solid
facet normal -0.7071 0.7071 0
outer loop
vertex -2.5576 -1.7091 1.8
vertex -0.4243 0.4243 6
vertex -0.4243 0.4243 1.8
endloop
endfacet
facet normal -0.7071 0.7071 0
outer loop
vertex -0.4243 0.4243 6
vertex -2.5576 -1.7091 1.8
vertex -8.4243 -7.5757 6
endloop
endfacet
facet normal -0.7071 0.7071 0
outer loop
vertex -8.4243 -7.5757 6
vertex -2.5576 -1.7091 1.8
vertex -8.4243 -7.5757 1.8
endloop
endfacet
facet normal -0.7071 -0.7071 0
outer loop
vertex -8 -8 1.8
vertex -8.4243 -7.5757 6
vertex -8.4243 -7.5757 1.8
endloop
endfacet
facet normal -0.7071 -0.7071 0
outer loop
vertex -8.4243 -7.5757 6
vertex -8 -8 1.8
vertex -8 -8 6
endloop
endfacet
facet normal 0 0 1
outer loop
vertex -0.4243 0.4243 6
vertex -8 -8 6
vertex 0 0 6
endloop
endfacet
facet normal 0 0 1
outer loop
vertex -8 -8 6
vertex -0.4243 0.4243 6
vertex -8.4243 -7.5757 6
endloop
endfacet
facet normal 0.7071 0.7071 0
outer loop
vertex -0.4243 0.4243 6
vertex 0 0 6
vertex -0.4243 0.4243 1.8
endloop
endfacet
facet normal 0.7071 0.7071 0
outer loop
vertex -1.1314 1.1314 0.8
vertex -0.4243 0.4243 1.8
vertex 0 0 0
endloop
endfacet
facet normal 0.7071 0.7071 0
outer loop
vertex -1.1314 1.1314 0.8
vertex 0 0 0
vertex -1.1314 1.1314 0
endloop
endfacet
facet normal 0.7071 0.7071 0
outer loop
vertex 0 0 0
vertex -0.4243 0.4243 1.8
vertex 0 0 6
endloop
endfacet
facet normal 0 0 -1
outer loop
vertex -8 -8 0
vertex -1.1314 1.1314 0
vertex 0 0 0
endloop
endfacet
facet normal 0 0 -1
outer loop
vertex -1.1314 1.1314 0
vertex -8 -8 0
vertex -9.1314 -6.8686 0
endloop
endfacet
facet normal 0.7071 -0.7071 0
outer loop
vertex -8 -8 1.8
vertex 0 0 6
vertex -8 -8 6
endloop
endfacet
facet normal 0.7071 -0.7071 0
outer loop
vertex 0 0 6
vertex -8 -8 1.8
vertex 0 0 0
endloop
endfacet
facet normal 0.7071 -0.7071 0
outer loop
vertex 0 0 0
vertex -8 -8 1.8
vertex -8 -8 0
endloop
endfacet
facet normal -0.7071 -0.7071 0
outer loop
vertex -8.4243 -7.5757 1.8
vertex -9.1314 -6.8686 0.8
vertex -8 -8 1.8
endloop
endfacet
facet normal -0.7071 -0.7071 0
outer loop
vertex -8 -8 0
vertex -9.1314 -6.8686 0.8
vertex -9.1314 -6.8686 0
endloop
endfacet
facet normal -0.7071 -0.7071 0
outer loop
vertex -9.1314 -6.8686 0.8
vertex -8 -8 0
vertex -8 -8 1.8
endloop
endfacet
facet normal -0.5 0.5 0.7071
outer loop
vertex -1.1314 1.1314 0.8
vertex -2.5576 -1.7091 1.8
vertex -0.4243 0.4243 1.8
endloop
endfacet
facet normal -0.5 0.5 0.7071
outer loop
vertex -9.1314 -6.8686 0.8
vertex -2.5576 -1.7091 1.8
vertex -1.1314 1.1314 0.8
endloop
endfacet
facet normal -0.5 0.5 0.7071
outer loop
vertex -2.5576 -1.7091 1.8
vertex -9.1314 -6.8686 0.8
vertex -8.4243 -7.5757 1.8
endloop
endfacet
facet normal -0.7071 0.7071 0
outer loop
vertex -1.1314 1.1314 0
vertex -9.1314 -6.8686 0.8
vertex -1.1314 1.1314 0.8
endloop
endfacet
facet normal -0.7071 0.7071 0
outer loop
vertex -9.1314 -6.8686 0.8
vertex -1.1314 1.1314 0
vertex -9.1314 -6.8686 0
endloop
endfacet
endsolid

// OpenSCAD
// file: ../scad/shape_modifier_utils.scad
// Overlap used to break coincident faces in booleans. Subtracting a cut that lands
// exactly on a surface leaves zero-thickness geometry, which renders unpredictably and
// slices worse; every cut is extended by this much so the faces genuinely cross.
//
// A function rather than a variable: `use <...>` exports functions but not top-level
// variable assignments, and the sweep reaches these files through `use`. Twelve modules
// across four files each declared their own `eps = 0.01` before this existed.
function geometry_eps() = 0.01;

// Length for a *centred* cutting solid that must pass entirely through material of
// depth `extent`. A centred cut reaches half this each way, so the factor leaves 50%
// clearance beyond `extent` on both sides -- a cut that lands flush on a face produces
// a zero-thickness shell rather than a clean hole.
//
// Measured against the swept parameter space: the deepest thing any of these cuts must
// clear is one bulkhead_section, one bulkhead_thickness tall, so the margin is 0.5 *
// bulkhead_thickness everywhere and scales with the part. Interconnect bulkheads stack
// two sections, but each section's cuts are applied before stacking, so the stack is
// not what a cut has to span.
function through_cut(extent) = 3 * extent;

// Distance at which to place a mask vertex so it lies outside anything within `extent`
// of the origin. Used by the half-plane polygons that trim an octant down to its
// wedge, where the vertex position only has to be "far enough" to be off the part.
//
// Worst case across 412 valid combinations is 3.25 mm of clearance, at U=0.5 with 1 mm
// panel: the shape reaches panel_offset + panel_overlap = 6.75 mm while the mask sits
// at 10 mm. Positive everywhere, and the gap widens with U.
function mask_reach(extent) = 2 * extent;


module octant_to_full() {
    mirror_x() {
        mirror_y() {
            mirror_xy() {
                children();
            }
        }
    }
}

module mirror_x() {
    union() {
        children();
        mirror([-1,0,0]) {
            children();
        }
    }
    
}

module mirror_y() {
    union() {
        children();
        mirror([0,-1,0]) {
            children();
        }
    }
    
}

module mirror_xy() {
    union() {
        children();
        mirror([1,-1,0]) {
            children();
        }
    }
}

module corner_translate(unit_width, corner_radius) {
    translate([unit_width/2-corner_radius,unit_width/2-corner_radius,0]) {
        children();
    }
}

// Move an octant out to its corner, then mirror it into all four -- the standard way
// a bulkhead profile is built from the one octant that is actually drawn.
//
// Every `*_shape` wrapper in fuselage_bulkhead_geometry.scad had this same pair open-
// coded around its own `*_octant` call. The wrappers stay: they name the full shape as
// distinct from the octant, and they are what seven call sites across two files use.
// It is the repeated body that is worth removing, not the interface.
module octant_tiled(unit_width, corner_radius) {
    octant_to_full() {
        corner_translate(unit_width, corner_radius) {
            children();
        }
    }
}


// mask lower diagonal quadrant
module octant_mask(unit_width, corner_radius) {
    eps = geometry_eps();
    polygon([[corner_radius+eps,corner_radius],
            [corner_radius+eps,-unit_width/2-corner_radius],
            [-unit_width/2-corner_radius+eps,-unit_width/2-corner_radius]]);
}

// fillet inward
module fillet_inner(radius) {
    intersection() {
        offset(r = -radius) {
            // fillet outward as well to ensure we round off any inward fillet artifacts (from input boundaries that are closer than 2*radius)
            offset(r = 2*radius) {
                offset(r = -radius) {
                    children();
                }
            }
        }
        // guarantee that the resultant shape has not gone outside the boundaries of the input shape
        children();
    }
}

// fillet outward
module fillet_outer(radius) {
    union() {
        offset(r = -radius) {
            offset(r = radius) {
                children();
            }
        }
        // guarantee that the resultant shape has not erroded into the boundaries of teh input shape
        children();
    }
}
// main file
// greeble_bolt_web on its own. This module was the one checked against an ad-hoc render
// rather than a file in this directory, so its number could not be reproduced from the
// repository; this makes it a reference like every other ported module's.
//
// Derived parameters for U=1.0 end_bolt 3/16in -- note plate_thickness 0.8 and
// flange_thickness 1.2 are distinct here, which the hand driver's equal values hide.
$fa=1;
$fs=0.05;

use <../scad/fuselage_bulkhead_geometry.scad>

bulkhead_thickness = 6;
bolt_offset = 8.0;
plate_thickness = 0.8;
flange_thickness = 1.2;
flange_chamfer = 1.0;

greeble_bolt_web(bulkhead_thickness, bolt_offset, plate_thickness, flange_thickness,
                 flange_chamfer);
